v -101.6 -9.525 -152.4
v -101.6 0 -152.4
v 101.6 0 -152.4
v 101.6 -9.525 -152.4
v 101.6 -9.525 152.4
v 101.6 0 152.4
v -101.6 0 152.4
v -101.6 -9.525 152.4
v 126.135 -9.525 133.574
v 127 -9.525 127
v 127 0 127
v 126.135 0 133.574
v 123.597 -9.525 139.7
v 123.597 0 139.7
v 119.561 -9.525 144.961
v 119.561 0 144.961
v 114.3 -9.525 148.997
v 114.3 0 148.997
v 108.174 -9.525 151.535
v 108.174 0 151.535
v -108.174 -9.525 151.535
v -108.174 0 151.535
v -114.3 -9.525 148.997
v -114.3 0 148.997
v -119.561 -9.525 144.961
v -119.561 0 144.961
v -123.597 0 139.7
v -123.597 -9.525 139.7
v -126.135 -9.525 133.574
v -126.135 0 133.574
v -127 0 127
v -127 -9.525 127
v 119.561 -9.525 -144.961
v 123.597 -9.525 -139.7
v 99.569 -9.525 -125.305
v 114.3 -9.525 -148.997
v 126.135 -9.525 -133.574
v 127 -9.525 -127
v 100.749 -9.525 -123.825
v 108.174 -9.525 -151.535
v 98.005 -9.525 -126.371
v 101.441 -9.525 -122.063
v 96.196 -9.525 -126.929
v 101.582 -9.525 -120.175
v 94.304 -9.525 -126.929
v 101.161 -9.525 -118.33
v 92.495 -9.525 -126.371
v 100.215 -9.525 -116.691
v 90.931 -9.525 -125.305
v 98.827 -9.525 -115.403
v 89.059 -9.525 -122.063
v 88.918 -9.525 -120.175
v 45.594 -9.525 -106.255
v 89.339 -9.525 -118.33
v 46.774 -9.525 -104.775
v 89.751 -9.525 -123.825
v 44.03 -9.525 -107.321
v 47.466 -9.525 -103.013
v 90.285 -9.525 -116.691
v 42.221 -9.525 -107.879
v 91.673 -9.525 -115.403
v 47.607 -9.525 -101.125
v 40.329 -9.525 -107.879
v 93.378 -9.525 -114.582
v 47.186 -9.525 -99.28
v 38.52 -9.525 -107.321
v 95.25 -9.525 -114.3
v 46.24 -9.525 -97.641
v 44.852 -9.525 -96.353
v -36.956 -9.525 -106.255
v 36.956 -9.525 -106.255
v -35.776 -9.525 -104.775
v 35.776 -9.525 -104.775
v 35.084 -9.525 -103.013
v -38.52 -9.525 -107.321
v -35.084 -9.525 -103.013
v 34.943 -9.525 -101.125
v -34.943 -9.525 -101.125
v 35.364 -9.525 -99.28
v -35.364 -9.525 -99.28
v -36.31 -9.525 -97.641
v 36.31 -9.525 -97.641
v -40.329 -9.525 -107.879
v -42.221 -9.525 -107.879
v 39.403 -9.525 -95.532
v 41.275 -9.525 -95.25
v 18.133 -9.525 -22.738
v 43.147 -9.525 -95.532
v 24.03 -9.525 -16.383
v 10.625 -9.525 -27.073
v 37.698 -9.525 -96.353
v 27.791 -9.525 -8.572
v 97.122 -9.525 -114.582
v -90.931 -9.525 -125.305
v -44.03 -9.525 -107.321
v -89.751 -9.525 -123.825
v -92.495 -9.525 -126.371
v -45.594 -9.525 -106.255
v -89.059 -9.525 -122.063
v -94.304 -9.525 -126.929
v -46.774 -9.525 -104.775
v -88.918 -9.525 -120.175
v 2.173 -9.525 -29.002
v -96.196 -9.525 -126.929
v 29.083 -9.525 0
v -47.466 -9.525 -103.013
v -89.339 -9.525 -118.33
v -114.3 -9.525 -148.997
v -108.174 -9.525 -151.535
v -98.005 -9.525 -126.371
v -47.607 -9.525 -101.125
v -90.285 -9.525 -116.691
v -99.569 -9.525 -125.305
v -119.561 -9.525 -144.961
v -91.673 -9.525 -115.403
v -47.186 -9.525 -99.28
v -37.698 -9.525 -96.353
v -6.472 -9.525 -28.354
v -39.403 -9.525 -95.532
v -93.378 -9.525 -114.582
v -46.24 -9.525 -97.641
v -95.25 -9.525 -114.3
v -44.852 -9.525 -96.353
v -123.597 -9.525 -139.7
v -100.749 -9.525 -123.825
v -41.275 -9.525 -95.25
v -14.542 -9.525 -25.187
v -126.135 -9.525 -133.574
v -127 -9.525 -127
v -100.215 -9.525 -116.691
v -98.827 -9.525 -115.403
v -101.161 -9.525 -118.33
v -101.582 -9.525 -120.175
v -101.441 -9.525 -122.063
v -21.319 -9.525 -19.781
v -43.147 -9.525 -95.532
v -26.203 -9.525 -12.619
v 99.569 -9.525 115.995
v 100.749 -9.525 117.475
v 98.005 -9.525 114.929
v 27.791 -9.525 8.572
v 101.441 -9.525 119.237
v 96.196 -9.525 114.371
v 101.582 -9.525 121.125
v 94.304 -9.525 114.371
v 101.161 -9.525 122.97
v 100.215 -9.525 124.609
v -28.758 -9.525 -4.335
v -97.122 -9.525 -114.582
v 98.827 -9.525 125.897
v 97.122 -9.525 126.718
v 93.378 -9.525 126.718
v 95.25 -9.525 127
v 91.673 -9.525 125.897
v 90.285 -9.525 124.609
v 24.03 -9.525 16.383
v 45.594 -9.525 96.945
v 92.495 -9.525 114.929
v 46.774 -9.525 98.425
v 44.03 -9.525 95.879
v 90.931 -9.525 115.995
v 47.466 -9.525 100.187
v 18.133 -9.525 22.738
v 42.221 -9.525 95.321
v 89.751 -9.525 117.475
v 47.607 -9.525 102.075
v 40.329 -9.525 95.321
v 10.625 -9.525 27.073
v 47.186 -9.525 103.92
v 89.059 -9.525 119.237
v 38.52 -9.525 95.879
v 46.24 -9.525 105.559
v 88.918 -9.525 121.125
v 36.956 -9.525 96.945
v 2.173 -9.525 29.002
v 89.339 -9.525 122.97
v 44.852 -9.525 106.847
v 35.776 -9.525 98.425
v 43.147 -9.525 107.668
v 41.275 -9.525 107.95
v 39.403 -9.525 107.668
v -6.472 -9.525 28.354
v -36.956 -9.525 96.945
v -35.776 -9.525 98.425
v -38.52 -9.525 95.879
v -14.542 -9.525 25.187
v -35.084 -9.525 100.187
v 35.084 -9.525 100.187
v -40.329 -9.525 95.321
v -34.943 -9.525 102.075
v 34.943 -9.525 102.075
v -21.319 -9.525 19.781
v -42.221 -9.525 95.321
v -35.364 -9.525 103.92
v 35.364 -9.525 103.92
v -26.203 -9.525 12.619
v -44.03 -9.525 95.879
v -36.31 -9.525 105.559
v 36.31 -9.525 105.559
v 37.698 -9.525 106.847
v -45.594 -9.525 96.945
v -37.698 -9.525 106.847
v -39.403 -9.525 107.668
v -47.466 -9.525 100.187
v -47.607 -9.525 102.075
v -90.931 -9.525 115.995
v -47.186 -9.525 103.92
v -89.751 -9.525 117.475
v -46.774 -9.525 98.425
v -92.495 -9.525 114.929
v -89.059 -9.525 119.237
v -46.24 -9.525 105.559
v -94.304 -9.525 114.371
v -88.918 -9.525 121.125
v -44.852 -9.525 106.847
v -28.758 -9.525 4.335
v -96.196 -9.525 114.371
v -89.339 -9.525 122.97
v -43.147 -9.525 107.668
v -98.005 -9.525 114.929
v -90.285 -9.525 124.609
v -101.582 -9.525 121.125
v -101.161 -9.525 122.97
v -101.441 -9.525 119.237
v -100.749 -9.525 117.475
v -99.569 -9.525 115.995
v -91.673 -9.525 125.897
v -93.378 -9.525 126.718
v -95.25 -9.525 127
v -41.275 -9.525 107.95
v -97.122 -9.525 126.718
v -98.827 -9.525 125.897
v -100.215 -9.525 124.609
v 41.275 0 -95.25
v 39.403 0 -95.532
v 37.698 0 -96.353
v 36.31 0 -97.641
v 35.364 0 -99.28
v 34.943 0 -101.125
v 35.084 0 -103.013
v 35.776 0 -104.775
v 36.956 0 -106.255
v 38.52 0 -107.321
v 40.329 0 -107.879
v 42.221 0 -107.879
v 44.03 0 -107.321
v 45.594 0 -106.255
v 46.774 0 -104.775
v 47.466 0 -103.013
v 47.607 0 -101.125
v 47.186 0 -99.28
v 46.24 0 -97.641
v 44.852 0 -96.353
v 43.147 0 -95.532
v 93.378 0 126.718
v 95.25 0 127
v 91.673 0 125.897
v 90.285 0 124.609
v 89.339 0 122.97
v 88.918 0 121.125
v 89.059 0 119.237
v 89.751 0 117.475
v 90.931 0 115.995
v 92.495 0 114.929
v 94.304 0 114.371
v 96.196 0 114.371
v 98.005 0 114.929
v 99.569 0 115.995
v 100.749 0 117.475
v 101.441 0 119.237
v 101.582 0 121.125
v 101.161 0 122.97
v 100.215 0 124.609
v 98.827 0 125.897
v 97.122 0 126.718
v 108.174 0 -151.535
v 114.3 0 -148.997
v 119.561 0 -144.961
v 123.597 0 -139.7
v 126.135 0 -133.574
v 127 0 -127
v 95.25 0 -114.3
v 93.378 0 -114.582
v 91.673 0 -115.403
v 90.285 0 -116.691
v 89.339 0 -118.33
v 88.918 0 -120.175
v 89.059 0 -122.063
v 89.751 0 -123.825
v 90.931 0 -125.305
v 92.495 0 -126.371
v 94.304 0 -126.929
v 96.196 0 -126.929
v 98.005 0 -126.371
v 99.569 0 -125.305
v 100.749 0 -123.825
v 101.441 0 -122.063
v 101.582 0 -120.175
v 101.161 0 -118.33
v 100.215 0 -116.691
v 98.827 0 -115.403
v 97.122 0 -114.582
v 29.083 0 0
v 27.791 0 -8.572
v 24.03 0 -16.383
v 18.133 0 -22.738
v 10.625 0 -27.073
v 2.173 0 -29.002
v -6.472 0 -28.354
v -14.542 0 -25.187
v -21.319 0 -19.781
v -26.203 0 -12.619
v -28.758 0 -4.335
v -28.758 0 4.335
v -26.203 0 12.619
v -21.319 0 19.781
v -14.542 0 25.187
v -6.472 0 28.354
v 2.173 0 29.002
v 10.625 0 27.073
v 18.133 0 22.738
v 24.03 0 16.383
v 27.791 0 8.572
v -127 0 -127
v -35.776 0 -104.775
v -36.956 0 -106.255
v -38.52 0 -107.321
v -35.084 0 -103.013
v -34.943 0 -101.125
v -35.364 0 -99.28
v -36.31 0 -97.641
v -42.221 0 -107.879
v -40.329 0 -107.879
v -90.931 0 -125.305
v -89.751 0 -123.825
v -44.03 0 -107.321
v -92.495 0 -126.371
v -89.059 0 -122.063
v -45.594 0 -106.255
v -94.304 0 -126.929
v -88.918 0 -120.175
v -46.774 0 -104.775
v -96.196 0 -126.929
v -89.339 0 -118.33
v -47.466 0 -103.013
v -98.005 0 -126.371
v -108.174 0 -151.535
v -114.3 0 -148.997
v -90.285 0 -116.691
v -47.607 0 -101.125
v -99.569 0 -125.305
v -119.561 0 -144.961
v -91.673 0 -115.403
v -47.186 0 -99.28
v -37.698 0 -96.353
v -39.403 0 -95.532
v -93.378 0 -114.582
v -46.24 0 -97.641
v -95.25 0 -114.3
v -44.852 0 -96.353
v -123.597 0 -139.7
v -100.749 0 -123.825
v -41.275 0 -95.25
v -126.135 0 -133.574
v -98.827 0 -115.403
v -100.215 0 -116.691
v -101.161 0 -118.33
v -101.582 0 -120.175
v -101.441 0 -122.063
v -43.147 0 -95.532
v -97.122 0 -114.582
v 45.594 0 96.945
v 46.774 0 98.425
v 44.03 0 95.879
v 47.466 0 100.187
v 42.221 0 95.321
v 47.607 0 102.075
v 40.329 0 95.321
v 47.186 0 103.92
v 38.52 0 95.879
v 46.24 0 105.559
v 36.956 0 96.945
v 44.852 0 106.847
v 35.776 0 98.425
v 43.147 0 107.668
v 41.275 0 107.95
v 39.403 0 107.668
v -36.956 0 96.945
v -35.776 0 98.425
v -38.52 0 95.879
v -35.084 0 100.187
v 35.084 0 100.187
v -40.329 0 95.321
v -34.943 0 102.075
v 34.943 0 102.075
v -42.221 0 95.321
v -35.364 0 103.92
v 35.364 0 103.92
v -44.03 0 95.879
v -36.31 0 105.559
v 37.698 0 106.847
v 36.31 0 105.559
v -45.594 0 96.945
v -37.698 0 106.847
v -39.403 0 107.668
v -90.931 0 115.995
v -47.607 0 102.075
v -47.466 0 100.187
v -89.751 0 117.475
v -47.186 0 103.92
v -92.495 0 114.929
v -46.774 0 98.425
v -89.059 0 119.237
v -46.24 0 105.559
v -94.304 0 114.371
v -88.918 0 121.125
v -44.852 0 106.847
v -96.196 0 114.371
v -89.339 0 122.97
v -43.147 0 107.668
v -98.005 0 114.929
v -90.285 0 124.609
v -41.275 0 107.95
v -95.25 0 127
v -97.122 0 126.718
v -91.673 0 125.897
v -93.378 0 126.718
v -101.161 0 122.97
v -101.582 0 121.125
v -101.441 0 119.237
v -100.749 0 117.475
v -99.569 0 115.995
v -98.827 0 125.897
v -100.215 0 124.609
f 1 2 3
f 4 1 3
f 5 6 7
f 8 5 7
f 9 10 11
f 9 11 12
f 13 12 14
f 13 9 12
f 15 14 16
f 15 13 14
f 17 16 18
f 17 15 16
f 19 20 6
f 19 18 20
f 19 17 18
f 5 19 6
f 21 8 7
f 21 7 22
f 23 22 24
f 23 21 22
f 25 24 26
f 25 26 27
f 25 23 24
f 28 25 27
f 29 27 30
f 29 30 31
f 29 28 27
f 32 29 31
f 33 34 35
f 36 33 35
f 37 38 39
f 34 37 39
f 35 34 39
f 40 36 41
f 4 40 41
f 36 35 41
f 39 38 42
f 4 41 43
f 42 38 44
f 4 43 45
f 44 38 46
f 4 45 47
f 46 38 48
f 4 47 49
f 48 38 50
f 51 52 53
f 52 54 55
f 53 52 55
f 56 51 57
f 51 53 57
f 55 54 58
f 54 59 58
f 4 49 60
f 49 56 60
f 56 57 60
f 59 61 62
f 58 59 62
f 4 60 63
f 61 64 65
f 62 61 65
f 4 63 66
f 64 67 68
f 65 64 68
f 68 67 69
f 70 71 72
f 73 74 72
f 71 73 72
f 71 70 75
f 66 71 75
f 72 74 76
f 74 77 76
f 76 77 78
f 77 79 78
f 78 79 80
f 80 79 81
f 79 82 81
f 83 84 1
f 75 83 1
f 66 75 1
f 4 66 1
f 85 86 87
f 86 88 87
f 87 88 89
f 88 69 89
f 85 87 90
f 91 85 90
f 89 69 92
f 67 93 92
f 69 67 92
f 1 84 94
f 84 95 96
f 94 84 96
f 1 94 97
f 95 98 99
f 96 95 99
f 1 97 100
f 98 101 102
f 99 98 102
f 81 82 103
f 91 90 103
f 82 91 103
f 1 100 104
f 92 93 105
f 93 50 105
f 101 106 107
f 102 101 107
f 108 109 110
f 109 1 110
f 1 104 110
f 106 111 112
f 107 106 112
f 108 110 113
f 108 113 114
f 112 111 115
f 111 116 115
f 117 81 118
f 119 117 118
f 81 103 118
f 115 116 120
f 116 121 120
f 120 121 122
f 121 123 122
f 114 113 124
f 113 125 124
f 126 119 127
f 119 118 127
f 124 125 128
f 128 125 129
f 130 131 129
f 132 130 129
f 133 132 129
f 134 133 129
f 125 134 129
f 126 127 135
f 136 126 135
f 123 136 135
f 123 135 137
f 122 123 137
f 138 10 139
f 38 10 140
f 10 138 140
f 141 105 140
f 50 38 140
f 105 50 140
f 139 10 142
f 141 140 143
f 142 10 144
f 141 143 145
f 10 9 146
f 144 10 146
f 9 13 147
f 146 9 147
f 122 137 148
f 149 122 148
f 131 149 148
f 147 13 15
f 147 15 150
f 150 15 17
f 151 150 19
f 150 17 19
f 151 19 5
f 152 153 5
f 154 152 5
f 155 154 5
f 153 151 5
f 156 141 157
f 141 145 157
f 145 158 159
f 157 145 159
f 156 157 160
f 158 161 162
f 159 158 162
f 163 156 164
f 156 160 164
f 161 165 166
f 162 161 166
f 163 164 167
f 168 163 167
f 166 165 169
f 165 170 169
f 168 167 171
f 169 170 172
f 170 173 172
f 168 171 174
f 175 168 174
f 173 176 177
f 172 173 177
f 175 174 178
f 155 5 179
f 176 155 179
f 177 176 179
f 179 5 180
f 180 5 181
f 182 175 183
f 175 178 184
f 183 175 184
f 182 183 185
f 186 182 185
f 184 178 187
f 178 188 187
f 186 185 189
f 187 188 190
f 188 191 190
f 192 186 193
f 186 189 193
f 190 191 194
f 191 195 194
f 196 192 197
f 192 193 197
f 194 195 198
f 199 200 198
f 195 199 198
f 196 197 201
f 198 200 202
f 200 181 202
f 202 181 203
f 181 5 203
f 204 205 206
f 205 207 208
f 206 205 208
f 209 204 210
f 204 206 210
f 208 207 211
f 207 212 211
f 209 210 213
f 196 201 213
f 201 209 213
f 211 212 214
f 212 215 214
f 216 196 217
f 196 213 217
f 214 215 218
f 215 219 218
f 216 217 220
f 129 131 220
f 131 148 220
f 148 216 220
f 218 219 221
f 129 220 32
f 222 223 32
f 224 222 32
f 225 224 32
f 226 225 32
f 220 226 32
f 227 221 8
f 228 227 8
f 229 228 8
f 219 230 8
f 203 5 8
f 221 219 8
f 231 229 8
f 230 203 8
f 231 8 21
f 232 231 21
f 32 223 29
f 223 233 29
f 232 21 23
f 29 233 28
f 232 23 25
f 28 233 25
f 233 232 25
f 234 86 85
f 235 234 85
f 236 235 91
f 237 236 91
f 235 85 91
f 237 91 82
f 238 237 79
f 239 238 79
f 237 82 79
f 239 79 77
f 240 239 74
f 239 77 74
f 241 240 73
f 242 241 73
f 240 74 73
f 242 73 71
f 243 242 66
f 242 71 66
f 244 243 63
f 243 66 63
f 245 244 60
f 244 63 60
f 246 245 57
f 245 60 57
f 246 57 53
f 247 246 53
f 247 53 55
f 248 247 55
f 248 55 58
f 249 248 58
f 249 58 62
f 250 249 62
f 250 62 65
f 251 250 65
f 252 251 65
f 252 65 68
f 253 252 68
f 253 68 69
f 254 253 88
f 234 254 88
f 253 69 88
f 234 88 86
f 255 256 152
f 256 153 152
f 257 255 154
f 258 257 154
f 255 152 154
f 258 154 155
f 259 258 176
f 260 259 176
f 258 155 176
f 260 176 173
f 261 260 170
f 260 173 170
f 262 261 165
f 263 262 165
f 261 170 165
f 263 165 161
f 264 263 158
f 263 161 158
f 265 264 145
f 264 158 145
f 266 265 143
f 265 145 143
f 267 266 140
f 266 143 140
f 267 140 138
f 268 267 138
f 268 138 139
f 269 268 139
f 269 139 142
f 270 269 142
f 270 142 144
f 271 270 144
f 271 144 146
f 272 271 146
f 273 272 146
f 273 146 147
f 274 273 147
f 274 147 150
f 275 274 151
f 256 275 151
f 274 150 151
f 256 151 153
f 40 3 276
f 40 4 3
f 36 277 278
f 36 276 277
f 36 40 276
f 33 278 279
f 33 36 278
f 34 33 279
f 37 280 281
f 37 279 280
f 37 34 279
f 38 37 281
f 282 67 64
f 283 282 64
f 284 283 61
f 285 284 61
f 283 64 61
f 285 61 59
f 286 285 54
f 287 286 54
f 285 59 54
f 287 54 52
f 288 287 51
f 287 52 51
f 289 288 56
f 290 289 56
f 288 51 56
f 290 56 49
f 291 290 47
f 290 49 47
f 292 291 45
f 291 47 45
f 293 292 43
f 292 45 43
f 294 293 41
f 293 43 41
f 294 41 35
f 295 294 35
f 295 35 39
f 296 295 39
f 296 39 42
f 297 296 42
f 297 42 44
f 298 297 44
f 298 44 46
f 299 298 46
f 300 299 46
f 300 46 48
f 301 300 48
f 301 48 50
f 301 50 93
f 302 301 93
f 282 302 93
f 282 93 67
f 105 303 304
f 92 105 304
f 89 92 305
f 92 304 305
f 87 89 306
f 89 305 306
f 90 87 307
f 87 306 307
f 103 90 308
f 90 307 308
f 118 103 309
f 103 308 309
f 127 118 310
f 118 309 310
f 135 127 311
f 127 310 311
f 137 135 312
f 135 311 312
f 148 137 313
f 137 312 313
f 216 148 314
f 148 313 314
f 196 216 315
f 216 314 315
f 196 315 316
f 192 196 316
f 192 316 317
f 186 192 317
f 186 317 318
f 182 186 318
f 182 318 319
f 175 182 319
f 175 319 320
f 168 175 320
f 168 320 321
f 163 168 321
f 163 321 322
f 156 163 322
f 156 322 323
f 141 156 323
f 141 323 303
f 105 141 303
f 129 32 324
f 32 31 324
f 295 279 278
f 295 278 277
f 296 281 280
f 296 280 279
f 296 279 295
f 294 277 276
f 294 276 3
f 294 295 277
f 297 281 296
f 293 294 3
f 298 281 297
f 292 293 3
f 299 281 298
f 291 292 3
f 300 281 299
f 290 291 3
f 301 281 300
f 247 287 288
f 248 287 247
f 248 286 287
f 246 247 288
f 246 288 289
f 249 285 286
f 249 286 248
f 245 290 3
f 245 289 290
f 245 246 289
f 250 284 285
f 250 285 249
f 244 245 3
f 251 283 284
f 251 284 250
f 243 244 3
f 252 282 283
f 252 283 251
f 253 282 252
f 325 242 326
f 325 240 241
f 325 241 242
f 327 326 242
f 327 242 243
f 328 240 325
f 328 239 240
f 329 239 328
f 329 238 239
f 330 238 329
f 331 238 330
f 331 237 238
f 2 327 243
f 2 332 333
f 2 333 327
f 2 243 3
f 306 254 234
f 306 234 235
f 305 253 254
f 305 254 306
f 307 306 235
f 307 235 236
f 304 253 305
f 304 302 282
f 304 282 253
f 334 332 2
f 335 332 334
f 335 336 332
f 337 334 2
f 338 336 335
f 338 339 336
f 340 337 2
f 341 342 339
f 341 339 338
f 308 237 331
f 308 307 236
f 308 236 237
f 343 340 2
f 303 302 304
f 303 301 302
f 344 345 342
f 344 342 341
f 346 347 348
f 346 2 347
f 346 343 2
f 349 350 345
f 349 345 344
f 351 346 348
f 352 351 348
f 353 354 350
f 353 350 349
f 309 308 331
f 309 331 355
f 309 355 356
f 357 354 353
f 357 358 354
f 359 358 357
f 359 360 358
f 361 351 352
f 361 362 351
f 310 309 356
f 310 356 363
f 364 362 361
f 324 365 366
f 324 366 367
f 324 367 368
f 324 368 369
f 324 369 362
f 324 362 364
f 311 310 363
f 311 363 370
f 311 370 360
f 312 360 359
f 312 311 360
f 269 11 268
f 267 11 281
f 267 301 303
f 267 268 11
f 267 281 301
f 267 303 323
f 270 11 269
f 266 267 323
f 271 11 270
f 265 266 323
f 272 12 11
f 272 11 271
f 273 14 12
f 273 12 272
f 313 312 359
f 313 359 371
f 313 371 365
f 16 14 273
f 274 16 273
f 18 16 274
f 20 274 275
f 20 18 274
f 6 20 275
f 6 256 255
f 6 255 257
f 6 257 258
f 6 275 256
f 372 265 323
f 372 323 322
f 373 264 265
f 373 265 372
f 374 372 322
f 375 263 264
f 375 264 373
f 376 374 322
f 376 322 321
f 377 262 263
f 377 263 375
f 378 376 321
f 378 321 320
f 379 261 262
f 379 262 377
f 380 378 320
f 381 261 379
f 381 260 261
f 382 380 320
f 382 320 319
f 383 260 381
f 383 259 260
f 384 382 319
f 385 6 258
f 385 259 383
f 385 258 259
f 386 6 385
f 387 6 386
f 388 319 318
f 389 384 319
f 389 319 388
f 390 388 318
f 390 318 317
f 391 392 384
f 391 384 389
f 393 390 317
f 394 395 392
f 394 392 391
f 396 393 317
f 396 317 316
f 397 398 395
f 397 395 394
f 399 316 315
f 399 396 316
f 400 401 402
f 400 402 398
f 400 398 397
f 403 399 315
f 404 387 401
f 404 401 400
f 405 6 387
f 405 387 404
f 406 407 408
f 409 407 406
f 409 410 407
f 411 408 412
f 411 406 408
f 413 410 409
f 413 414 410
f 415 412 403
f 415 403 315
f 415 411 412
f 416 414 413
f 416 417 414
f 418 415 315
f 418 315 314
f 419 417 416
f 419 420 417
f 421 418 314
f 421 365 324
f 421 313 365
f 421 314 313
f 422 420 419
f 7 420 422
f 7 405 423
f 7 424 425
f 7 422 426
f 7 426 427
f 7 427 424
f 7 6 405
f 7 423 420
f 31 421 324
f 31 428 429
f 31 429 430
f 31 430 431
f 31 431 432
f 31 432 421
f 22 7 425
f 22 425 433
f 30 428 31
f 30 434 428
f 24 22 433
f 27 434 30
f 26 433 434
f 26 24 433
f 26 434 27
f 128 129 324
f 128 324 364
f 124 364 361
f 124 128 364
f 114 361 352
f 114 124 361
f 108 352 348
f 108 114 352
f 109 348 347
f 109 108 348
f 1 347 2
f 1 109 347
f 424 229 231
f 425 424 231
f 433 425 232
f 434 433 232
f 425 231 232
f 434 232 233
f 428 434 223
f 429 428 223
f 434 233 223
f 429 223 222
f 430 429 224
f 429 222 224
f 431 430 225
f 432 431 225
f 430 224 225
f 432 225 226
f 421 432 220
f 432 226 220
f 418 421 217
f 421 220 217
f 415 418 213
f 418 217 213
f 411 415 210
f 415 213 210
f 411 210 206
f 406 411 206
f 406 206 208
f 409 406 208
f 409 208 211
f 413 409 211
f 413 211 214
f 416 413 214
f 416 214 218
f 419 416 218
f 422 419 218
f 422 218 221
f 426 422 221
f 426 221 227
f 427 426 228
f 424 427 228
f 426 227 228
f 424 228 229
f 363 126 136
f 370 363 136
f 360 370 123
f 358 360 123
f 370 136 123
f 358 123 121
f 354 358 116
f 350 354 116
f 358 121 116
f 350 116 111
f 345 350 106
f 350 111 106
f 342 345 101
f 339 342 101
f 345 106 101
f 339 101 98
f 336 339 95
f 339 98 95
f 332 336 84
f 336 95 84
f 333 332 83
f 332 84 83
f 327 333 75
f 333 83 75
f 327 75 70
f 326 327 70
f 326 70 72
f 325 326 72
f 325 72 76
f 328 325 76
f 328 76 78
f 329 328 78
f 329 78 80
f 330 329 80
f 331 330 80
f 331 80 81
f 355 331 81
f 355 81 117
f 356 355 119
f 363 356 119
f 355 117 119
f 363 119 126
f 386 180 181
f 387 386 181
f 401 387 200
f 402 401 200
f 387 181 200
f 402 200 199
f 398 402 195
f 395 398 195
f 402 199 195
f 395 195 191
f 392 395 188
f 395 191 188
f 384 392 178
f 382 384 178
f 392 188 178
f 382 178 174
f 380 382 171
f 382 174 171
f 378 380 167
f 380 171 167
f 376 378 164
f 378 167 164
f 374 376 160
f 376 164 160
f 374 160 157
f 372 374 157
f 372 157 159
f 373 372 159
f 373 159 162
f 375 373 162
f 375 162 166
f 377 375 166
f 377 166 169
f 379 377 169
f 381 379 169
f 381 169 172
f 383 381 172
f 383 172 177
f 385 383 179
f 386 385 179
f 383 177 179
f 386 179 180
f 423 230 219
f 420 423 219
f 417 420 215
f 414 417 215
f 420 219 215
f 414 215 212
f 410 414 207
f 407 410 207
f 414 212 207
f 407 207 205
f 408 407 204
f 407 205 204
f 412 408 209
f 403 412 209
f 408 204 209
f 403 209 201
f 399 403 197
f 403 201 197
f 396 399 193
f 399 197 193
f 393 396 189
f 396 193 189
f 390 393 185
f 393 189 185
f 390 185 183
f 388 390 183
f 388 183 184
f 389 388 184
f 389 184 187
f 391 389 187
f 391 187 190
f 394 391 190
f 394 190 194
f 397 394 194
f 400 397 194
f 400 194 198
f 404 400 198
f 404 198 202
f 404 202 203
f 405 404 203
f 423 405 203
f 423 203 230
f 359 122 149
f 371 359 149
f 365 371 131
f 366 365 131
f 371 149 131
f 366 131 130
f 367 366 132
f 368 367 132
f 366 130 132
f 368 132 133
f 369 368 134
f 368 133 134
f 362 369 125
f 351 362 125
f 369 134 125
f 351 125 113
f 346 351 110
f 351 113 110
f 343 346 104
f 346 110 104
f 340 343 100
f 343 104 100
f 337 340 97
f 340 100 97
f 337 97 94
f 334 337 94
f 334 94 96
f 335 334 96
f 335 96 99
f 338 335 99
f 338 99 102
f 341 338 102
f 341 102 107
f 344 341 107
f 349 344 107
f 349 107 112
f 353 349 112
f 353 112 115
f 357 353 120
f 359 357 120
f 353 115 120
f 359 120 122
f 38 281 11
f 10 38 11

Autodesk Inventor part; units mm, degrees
ref_plane "YZ Plane" through (0, 0, 0) normal (1, 0, 0) x (0, 1, 0)
ref_plane "XZ Plane" through (0, 0, 0) normal (0, 1, 0) x (-1, 0, 0)
ref_plane "XY Plane" through (0, 0, 0) normal (0, 0, 1) x (1, 0, 0)
sketch "Sketch4" plane through (0, 0, 0) normal (0, 1, 0) x (-1, 0, 0)
  line L0 (-127, 152.4) -> (127, 152.4)
  line L1 (127, 152.4) -> (127, -152.4)
  line L2 (127, -152.4) -> (-127, -152.4)
  line L3 (-127, -152.4) -> (-127, 152.4)
  line L4 (-127, 152.4) -> (127, -152.4) construction
  line L5 (127, 152.4) -> (-127, -152.4) construction
  point P0 (0, 0)
  dimension "d6" = 304.8
  dimension "d7" = 254
extrude "Plate1" add sketch "Sketch4" against normal blind 9.525
sketch "Sketch6" plane through (0, 0, 0) normal (0, 1, 0) x (1, 0, 0)
  circle A0 centre (0, 0) radius 29.083
  dimension "d19" = 58.166
extrude "Cut1" cut sketch "Sketch6" against normal blind 9.525
sketch "Sketch7" plane through (0, 0, 0) normal (0, 1, 0) x (1, 0, 0)
  line L0 (-41.275, -101.6) -> (41.275, -101.6)
  line L1 (41.275, -101.6) -> (41.275, 101.6)
  line L2 (41.275, 101.6) -> (-41.275, 101.6)
  line L3 (-41.275, 101.6) -> (-41.275, -101.6)
  line L4 (-41.275, -101.6) -> (41.275, 101.6) construction
  line L5 (41.275, -101.6) -> (-41.275, 101.6) construction
  line L6 (127, 152.4) -> (-127, 152.4) projected
  point P0 (0, 0)
  point P1 (112.6998, 215.9)
  point P2 (-112.6998, 215.9)
  point P3 (-127, 152.4)
  dimension "d22" = 82.55
  dimension "d23" = 50.8
hole "Hole1" at (-41.275, 0, 101.6) at (41.275, 0, 101.6) at (-41.275, 0, -101.6) at (41.275, 0, -101.6) direction (0, -1, 0) diameter 12.7 depth 9.525
sketch "Sketch8" plane through (0, 0, 0) normal (0, 1, 0) x (1, 0, 0)
  line L0 (-95.25, -120.65) -> (95.25, -120.65)
  line L1 (95.25, -120.65) -> (95.25, 120.65)
  line L2 (95.25, 120.65) -> (-95.25, 120.65)
  line L3 (-95.25, 120.65) -> (-95.25, -120.65)
  line L4 (-95.25, -120.65) -> (95.25, 120.65) construction
  line L5 (95.25, -120.65) -> (-95.25, 120.65) construction
  line L6 (127, -152.4) -> (127, 152.4) projected
  line L7 (127, 152.4) -> (-127, 152.4) projected
  point P0 (0, 0)
  dimension "d32" = 31.75
  dimension "d33" = 31.75
hole "Hole2" at (95.25, 0, 120.65) at (95.25, 0, -120.65) at (-95.25, 0, -120.65) at (-95.25, 0, 120.65) direction (0, -1, 0) diameter 12.7 depth 9.525
fillet "Corner Round2" radius 25.4 4 edges at (127, -4.7625, 152.4) (127, -4.7625, -152.4) (-127, -4.7625, 152.4) (-127, -4.7625, -152.4)
equation "\"d20\" = Thickness"
equation "\"d29\" = Thickness"
equation "\"d39\" = Thickness"
equation "\"d8\" = Thickness"
equation "\"BendReliefWidth\" = Thickness"
equation "\"BendReliefDepth\" = 0.5 * Thickness"
equation "\"CornerReliefSize\" = 4 * Thickness"
equation "\"MinimumRemnant\" = 2 * Thickness"
equation "\"TransitionRadius\" = BendRadius"
equation "\"JacobiRadiusSize\" = Thickness"
equation "\"GapSize\" = Thickness"
equation "\"Thickness\" = 9.525"
equation "\"BendRadius\" = 13.208"
properties part number "Gooseneck Model-2 Sheet-1" material "SS304"
